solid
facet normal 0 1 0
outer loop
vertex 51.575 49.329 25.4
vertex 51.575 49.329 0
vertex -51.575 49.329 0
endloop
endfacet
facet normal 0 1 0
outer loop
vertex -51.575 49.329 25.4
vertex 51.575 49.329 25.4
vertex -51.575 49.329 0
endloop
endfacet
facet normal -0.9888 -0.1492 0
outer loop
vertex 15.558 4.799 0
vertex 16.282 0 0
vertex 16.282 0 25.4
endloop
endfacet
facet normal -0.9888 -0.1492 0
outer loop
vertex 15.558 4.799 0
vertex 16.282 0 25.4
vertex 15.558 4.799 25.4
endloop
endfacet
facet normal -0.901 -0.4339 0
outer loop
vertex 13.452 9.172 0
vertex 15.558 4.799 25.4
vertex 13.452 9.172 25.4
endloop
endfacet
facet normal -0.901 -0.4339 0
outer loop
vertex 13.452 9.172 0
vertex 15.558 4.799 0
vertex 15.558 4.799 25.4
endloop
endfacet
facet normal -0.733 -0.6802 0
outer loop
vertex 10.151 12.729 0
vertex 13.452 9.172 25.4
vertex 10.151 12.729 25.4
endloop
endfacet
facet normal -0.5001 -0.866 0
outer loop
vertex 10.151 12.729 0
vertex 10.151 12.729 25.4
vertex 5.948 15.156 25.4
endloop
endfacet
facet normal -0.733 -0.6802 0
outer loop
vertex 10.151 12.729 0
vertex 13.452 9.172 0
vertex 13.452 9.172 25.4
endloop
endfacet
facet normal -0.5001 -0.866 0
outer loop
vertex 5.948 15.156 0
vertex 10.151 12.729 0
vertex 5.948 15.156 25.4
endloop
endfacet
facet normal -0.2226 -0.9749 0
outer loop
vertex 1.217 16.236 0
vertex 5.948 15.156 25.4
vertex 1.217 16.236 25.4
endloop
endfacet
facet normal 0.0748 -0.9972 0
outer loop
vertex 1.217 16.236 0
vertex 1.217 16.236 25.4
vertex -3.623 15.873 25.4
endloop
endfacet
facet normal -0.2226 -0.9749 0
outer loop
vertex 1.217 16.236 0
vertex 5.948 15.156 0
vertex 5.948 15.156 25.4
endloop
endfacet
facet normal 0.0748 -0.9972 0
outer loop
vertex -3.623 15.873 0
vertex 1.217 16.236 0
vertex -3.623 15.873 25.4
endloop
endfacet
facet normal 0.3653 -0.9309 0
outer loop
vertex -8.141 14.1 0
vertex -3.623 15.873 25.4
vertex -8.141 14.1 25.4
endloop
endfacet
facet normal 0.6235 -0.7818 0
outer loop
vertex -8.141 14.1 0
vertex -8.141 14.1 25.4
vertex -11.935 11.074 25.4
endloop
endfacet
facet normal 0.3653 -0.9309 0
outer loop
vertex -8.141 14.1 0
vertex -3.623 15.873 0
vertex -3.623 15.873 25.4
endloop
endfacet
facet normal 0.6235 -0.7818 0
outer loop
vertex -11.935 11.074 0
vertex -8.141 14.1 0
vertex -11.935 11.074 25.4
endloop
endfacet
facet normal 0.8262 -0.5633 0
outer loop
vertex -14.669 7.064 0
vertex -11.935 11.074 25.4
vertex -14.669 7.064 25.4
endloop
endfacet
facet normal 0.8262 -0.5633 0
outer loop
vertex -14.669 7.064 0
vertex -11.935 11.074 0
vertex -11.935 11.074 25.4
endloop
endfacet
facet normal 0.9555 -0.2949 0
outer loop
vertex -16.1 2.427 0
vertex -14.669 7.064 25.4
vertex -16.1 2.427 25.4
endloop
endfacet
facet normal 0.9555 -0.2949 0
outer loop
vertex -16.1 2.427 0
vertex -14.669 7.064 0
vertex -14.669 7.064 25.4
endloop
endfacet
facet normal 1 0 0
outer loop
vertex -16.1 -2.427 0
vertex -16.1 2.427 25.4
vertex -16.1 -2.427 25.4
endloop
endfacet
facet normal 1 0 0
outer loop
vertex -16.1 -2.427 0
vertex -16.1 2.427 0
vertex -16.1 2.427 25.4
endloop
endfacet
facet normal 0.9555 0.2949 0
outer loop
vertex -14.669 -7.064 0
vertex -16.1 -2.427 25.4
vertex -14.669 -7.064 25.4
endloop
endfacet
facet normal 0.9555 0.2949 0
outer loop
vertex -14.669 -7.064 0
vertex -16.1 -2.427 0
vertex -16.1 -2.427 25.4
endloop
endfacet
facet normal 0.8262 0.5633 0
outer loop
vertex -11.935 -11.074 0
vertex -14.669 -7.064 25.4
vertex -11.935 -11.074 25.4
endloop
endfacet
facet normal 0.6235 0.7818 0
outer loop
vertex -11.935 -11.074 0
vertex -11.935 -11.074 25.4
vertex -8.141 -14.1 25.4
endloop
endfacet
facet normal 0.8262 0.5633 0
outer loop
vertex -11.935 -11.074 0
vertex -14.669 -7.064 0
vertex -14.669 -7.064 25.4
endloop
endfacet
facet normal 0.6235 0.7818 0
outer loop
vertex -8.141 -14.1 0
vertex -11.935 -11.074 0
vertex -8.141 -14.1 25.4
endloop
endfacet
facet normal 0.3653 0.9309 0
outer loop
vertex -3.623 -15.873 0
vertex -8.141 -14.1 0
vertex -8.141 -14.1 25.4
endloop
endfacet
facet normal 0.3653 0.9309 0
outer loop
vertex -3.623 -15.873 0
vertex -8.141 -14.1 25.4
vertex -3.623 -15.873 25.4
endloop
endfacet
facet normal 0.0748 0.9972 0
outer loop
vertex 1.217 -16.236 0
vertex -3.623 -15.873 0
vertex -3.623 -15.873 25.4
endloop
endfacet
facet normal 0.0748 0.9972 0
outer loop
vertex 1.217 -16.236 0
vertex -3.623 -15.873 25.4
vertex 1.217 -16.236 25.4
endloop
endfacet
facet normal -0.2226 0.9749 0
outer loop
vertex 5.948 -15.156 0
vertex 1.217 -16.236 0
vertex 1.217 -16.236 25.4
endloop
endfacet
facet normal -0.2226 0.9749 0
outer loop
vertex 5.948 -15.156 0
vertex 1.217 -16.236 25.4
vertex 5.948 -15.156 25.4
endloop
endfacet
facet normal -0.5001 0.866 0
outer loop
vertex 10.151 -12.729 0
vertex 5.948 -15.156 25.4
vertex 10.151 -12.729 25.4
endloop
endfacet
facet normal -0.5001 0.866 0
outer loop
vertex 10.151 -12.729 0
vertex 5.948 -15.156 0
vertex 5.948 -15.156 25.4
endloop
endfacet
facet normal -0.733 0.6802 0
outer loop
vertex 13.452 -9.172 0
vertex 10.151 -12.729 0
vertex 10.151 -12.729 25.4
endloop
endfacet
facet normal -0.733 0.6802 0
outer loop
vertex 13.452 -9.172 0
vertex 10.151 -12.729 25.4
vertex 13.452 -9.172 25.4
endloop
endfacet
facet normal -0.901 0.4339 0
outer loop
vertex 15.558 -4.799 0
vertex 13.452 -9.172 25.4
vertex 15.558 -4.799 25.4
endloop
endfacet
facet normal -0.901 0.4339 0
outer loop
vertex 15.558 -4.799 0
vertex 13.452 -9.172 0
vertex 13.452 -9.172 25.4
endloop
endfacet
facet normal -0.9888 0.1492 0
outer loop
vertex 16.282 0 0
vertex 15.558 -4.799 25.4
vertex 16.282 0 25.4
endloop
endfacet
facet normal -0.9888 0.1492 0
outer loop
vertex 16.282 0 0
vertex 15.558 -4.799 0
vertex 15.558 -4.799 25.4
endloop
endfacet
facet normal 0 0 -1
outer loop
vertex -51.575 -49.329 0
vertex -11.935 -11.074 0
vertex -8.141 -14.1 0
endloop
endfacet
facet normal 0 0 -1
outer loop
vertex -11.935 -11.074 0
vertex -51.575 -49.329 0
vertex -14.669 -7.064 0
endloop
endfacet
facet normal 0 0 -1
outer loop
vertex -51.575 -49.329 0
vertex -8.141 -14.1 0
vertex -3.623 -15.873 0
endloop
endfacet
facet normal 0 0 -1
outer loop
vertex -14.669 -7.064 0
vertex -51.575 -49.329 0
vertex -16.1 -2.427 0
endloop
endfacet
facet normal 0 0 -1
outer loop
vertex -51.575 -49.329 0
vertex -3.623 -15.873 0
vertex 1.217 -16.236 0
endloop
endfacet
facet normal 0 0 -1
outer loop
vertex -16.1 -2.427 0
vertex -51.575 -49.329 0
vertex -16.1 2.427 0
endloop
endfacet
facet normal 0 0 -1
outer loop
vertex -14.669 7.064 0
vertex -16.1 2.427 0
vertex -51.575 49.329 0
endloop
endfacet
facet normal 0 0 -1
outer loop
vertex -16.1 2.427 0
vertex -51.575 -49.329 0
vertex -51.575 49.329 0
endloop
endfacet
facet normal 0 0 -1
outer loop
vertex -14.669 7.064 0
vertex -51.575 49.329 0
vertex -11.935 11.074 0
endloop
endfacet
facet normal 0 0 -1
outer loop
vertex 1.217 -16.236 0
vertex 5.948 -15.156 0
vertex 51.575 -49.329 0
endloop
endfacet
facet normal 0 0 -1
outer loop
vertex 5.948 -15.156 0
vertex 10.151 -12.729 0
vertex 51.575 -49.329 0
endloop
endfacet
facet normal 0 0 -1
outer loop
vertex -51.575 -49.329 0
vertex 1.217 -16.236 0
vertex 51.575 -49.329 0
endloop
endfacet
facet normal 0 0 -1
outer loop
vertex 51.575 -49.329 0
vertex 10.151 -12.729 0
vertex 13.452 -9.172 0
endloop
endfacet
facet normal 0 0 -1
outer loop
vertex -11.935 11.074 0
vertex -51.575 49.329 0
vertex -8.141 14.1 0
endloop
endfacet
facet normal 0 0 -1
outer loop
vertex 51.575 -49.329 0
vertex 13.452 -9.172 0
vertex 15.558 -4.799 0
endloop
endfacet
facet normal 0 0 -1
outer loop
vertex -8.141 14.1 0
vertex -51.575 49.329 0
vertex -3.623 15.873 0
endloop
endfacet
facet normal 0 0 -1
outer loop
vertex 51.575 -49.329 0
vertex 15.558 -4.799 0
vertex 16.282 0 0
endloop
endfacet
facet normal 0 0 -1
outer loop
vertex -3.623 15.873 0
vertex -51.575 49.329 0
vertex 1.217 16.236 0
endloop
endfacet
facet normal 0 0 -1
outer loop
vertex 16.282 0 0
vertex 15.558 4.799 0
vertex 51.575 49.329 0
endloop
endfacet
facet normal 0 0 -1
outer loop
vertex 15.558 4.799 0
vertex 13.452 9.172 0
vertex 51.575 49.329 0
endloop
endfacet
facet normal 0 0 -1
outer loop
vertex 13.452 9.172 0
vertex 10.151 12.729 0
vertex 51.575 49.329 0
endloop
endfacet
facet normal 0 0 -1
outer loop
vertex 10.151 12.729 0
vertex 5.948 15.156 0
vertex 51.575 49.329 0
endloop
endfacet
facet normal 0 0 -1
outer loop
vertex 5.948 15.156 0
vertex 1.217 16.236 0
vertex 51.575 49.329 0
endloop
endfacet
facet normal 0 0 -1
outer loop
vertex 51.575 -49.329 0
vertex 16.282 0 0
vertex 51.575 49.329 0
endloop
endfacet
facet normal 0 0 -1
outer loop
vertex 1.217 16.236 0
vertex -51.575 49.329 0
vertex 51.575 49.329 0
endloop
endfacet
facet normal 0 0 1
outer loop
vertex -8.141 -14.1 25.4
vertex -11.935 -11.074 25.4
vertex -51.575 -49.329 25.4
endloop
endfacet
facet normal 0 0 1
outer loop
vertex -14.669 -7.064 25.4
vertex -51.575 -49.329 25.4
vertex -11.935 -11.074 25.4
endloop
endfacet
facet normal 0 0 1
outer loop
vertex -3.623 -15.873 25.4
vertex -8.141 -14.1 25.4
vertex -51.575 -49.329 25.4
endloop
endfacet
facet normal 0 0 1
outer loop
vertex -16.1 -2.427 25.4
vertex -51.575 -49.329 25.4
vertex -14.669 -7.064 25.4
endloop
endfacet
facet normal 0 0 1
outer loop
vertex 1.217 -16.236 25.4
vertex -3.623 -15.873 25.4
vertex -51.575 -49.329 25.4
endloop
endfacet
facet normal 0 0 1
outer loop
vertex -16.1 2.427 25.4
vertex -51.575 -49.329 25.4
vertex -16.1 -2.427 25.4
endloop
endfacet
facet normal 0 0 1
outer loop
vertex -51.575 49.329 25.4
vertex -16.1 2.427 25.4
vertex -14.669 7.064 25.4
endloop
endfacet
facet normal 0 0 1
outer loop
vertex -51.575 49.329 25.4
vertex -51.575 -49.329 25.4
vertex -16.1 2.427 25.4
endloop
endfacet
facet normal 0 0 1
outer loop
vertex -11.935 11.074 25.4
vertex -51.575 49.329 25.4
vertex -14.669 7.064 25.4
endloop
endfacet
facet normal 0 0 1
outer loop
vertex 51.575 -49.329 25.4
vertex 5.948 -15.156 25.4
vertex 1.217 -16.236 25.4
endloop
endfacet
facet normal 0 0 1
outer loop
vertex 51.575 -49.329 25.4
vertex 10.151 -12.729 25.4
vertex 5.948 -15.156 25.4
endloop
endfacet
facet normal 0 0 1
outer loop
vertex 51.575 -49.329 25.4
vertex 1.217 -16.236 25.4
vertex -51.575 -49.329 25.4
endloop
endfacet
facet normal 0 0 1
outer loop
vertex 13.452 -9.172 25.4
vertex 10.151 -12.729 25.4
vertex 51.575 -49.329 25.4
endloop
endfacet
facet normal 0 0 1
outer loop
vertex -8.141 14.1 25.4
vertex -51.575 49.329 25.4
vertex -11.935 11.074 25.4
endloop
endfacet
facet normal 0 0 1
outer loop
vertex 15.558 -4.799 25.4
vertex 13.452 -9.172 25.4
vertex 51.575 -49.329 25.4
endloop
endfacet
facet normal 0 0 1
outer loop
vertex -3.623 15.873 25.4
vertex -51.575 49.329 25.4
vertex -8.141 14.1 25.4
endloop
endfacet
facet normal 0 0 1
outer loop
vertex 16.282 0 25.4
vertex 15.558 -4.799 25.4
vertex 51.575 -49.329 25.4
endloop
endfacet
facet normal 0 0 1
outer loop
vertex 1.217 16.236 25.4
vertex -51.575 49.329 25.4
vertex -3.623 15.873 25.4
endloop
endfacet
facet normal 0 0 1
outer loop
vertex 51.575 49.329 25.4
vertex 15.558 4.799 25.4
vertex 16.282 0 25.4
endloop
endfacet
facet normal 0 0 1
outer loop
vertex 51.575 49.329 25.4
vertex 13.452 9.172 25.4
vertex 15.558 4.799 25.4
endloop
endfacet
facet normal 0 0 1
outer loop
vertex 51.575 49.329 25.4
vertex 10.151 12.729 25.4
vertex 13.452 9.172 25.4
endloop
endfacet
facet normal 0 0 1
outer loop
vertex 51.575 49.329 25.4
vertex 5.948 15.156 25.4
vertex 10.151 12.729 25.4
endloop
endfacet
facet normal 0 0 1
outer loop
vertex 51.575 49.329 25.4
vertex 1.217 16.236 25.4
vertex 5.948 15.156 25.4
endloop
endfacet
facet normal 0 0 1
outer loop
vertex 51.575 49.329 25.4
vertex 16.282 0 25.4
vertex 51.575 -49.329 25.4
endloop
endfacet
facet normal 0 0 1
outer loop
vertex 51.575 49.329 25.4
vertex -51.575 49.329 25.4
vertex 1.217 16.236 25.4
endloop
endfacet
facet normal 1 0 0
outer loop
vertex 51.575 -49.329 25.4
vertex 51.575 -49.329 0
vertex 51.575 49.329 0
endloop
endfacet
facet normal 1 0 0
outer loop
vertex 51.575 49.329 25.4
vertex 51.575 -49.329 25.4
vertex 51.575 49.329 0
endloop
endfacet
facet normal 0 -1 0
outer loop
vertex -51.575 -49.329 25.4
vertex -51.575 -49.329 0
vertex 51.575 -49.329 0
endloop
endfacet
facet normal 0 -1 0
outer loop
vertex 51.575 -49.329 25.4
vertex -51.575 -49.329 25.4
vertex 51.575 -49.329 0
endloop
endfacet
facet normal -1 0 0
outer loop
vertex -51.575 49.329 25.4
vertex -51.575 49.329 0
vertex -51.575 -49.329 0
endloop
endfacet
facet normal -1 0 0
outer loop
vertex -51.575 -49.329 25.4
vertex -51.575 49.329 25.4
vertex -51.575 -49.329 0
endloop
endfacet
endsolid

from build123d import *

# Parameters (mm, degrees)
F0_R     = 16.2815755653
F1_DEPTH = 25.4
F3_DEPTH = 25.4


# Not quite as in the source:
# - the program builds the solid bodies; features that only make, move or delete a surface that nothing else refers to are left out


with BuildPart() as f1:
    # F0 (on Top) → F1 (new body)
    with BuildSketch(Plane.XY):
        Polygon((-32.1844741702, 49.3294708431), (-51.5748507939, 49.3294708431), (-51.5748507939, -49.3294708431), (51.5748507939, -49.3294708431), (51.5748507939, 49.3294708431), (-11.7852937953, 49.3294708431), align=None)
        Circle(F0_R, mode=Mode.SUBTRACT)
    extrude(amount=F1_DEPTH)

    # F0 (on Top) → F3 (join)
    with BuildSketch(Plane.XY):
        Polygon((-32.1844741702, 49.3294708431), (-51.5748507939, 49.3294708431), (-51.5748507939, -49.3294708431), (51.5748507939, -49.3294708431), (51.5748507939, 49.3294708431), (-11.7852937953, 49.3294708431), align=None)
        Circle(F0_R, mode=Mode.SUBTRACT)
    extrude(amount=F3_DEPTH)


solid = f1.part
